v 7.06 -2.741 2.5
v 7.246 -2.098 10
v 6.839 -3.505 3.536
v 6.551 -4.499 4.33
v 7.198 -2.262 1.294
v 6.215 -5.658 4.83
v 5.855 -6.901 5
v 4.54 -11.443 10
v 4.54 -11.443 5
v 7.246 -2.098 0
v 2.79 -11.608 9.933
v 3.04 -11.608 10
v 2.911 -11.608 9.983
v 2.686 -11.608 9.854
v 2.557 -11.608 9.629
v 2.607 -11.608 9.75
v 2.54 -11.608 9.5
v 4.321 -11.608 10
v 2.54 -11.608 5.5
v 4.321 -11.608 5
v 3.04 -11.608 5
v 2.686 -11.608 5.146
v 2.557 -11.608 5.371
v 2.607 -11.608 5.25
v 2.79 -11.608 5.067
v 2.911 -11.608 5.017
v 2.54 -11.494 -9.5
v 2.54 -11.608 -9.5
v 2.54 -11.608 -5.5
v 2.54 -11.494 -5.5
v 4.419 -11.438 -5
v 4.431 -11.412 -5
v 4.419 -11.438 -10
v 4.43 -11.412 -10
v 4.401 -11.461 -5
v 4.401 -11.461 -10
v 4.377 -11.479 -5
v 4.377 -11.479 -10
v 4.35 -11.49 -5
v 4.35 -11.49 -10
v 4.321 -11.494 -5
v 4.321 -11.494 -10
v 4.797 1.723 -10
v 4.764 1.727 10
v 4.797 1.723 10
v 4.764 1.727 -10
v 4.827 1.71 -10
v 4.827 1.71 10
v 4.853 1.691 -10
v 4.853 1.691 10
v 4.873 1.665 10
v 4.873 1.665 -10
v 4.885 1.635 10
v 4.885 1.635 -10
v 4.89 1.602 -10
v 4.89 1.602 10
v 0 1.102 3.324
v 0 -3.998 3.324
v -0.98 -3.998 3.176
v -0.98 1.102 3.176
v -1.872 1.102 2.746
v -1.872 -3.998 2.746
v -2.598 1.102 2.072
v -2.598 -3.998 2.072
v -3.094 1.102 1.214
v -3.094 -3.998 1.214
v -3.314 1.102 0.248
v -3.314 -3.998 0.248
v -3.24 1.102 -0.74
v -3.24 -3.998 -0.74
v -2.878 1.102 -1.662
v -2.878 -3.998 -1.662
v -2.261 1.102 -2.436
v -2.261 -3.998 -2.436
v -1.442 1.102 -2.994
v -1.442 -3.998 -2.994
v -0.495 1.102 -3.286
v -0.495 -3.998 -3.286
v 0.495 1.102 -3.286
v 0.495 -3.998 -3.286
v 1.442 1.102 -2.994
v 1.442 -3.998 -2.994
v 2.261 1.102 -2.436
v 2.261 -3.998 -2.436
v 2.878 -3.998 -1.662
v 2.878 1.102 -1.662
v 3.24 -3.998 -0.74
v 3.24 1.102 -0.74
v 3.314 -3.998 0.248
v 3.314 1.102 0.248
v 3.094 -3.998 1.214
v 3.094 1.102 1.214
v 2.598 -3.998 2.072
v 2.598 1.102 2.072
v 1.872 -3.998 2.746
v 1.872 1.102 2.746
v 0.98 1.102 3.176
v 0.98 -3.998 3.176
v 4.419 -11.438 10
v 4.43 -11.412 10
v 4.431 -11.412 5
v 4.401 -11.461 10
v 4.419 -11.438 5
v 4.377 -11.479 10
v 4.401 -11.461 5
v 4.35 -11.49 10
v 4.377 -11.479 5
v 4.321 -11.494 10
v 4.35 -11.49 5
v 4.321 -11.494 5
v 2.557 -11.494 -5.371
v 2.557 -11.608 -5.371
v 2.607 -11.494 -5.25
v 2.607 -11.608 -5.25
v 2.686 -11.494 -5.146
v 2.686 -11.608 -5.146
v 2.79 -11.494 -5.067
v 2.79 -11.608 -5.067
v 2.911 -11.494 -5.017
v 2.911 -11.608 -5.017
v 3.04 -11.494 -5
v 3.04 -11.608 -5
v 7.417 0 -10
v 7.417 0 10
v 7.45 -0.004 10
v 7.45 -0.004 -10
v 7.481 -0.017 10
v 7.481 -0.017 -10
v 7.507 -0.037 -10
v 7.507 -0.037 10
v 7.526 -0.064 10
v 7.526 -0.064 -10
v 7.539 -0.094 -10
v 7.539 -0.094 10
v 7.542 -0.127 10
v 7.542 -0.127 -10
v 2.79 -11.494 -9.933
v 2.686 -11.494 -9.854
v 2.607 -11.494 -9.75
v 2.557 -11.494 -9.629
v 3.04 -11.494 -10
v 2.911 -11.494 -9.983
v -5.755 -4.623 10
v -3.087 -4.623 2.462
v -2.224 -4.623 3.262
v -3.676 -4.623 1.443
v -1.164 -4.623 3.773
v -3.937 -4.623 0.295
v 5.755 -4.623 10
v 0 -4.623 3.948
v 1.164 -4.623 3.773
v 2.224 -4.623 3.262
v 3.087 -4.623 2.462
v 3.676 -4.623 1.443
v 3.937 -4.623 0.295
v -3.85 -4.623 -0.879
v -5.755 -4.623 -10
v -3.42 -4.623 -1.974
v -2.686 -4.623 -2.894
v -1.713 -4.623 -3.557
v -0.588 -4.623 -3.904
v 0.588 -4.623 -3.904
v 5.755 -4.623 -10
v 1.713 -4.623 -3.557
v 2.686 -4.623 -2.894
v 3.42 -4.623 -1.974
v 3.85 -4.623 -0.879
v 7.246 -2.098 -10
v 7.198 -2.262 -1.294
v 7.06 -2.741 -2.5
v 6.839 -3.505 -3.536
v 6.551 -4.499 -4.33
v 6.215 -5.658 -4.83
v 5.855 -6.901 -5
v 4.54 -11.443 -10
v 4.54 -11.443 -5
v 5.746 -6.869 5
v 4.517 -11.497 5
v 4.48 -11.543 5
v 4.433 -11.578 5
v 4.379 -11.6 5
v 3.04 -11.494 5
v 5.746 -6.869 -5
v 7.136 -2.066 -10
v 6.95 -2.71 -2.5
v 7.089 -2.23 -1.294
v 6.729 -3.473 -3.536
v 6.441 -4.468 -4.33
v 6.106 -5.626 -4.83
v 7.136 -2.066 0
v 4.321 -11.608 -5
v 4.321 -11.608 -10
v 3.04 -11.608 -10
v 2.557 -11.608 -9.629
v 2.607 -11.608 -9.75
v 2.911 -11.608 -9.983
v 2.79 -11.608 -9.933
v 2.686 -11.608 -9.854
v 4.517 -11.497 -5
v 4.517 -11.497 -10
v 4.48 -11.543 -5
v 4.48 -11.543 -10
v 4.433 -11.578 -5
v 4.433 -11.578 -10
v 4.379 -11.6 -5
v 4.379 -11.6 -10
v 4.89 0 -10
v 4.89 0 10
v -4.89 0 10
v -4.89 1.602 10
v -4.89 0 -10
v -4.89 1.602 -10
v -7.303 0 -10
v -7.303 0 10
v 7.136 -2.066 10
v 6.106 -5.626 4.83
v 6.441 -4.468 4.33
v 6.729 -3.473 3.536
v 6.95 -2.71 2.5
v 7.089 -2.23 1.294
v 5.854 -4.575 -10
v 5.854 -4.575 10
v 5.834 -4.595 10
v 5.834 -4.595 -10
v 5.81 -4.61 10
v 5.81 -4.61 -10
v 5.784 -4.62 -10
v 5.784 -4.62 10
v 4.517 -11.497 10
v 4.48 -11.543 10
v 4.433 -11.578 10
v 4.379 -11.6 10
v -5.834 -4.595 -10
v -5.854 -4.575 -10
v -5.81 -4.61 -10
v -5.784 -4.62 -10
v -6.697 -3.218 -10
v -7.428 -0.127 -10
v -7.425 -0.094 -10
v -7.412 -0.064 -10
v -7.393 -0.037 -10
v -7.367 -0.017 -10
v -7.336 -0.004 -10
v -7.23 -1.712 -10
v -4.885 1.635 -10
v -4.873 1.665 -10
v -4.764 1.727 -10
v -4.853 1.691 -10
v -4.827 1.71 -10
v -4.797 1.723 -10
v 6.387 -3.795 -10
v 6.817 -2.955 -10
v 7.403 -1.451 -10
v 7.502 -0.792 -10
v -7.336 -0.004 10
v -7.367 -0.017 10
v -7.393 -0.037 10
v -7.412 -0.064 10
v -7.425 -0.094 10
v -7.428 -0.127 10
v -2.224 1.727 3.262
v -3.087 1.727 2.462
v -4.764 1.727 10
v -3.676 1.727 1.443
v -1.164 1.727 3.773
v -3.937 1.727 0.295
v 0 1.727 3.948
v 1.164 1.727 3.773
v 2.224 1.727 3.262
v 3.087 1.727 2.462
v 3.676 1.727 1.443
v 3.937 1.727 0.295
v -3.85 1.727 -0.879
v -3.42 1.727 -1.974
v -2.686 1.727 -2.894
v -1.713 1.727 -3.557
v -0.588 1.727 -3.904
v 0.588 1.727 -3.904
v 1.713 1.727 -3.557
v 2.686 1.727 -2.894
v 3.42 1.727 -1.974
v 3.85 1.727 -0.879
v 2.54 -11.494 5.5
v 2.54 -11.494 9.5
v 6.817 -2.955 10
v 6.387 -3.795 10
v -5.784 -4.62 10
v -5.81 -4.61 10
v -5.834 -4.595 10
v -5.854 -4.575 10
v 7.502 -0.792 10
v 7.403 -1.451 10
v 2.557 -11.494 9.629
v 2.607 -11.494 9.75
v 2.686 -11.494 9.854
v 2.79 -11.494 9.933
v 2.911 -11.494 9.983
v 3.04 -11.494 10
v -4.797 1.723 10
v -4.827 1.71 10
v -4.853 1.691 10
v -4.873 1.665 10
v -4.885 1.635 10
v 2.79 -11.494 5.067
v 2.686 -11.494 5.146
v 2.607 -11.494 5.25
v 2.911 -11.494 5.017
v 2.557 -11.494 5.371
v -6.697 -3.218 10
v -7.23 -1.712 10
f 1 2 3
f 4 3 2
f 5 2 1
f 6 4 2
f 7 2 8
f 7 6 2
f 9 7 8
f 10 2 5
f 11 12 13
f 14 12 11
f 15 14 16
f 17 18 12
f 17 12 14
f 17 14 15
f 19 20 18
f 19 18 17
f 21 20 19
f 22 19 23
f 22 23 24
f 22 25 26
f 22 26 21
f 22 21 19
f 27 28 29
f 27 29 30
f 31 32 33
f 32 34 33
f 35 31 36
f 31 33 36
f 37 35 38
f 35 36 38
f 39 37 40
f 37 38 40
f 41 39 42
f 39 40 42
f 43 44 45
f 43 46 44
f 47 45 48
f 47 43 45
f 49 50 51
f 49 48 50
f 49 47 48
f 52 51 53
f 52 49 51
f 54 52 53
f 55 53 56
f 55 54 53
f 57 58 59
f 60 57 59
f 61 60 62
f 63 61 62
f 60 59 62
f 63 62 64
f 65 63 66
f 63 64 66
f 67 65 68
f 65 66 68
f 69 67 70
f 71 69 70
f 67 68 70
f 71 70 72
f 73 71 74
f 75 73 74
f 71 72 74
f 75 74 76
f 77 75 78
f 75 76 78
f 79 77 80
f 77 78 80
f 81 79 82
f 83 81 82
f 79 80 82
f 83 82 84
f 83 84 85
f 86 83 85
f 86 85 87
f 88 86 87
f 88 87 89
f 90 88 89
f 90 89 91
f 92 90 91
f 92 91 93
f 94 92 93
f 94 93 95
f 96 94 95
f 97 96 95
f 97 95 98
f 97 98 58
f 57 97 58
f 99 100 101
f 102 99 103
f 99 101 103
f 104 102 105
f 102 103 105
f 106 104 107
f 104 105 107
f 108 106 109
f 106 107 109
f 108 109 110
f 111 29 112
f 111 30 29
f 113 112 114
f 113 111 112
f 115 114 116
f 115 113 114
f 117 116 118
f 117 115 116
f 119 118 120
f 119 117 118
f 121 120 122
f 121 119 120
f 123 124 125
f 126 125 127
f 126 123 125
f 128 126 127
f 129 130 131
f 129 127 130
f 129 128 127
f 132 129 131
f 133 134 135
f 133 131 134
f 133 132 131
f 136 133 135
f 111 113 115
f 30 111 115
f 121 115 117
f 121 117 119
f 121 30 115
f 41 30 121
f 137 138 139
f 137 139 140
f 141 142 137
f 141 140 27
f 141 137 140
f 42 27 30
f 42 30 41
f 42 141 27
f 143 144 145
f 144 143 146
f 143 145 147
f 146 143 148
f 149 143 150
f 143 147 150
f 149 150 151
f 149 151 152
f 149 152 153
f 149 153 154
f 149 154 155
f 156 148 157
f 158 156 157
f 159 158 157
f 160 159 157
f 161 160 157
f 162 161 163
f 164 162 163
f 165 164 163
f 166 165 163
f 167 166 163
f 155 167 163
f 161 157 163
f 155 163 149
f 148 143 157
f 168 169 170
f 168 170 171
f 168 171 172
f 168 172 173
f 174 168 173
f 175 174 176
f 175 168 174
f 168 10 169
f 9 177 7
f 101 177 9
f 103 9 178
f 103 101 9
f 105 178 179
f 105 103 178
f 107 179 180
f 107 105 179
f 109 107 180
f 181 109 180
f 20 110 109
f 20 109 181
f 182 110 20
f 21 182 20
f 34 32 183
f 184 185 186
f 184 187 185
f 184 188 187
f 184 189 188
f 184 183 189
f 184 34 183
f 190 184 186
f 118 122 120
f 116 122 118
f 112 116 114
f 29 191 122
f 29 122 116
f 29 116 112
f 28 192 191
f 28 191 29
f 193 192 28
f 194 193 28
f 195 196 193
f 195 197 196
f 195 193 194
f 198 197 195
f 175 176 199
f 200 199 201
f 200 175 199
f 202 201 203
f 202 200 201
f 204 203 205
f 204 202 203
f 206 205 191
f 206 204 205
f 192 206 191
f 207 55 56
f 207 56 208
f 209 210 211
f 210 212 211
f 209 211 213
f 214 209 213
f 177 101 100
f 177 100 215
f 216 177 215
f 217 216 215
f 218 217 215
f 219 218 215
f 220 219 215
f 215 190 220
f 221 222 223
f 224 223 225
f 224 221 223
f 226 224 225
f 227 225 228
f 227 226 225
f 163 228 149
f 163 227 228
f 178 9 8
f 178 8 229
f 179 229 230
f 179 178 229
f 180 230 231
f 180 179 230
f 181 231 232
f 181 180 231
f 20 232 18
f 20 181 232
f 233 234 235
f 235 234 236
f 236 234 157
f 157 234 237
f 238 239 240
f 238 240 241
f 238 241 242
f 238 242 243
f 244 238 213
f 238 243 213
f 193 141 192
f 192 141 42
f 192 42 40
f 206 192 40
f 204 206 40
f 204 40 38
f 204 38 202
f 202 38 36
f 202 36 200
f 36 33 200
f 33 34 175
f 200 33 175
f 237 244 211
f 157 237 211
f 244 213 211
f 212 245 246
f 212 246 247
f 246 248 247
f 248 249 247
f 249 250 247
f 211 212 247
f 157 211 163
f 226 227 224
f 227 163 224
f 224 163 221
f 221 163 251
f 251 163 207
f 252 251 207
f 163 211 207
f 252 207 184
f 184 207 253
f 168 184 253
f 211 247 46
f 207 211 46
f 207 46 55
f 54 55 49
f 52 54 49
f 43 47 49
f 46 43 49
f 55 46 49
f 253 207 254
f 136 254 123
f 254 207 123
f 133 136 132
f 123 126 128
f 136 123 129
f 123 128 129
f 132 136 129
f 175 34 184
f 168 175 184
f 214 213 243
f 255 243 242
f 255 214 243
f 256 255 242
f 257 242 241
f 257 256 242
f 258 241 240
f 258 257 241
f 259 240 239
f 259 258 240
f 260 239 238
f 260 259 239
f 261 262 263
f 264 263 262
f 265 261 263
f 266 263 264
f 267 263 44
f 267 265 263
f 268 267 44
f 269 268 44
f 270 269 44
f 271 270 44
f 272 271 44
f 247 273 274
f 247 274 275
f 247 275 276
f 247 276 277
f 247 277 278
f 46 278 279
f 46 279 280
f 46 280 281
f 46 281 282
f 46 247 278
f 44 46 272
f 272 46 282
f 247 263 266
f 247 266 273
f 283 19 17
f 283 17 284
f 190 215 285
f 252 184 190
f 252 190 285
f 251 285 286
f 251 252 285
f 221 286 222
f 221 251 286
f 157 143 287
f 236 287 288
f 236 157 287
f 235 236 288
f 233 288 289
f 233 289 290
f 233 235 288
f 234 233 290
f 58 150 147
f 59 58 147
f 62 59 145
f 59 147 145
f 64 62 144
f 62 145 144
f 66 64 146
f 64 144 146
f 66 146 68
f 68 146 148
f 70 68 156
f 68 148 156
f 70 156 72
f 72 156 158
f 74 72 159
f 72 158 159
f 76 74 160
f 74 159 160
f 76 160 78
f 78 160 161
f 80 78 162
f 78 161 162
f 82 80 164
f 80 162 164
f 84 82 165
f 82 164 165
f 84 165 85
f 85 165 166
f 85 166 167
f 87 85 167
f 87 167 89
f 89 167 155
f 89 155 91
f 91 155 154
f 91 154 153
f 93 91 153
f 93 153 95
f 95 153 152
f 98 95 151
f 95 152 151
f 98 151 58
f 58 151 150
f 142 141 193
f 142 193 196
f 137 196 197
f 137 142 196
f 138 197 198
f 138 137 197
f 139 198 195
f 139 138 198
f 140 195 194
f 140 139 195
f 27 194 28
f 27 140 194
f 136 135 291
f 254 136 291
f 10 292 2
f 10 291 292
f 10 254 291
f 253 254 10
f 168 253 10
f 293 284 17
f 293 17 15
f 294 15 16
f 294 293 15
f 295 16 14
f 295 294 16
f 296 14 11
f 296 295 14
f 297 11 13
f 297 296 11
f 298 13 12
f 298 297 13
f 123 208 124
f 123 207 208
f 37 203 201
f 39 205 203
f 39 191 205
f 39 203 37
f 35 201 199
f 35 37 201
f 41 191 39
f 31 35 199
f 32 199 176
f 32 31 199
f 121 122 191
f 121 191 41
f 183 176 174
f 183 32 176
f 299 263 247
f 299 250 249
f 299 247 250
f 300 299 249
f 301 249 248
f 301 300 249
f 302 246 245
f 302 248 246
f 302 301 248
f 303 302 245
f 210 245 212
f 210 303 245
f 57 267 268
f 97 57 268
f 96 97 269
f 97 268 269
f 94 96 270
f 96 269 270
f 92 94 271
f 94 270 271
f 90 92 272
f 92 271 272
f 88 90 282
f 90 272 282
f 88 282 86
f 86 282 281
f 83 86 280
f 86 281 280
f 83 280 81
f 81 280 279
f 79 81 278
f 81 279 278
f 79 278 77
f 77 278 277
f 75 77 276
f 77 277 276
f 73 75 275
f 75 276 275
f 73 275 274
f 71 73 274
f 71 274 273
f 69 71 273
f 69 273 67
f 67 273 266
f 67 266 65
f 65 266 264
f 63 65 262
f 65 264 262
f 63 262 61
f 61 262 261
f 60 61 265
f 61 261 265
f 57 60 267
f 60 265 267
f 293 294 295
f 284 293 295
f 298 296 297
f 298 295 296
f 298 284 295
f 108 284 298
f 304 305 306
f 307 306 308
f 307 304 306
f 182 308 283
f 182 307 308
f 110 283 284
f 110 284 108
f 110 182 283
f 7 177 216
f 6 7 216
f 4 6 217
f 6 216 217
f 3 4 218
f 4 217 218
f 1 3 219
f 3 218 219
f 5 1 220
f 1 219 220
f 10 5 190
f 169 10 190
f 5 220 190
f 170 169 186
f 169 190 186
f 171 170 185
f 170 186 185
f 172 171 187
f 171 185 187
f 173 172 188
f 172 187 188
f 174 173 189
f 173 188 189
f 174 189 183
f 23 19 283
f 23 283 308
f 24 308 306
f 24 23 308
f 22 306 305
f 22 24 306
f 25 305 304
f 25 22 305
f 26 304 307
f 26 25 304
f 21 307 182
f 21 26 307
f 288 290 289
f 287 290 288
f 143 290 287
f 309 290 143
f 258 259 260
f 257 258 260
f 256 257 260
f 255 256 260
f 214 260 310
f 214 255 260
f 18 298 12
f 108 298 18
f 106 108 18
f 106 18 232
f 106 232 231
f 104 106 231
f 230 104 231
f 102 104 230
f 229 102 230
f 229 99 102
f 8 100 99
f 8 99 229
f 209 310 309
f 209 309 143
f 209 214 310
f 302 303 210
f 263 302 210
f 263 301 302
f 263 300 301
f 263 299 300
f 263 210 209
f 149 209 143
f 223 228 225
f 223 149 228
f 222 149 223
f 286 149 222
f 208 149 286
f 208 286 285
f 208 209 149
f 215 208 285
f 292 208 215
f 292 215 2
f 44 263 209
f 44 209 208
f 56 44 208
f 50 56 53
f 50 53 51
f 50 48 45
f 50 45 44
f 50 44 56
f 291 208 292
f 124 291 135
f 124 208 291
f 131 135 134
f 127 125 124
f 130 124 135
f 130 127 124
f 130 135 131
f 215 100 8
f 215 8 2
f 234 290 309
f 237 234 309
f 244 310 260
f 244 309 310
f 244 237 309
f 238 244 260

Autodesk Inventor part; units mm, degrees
ref_plane "YZ Plane" through (0, 0, 0) normal (1, 0, 0) x (0, 1, 0)
ref_plane "XZ Plane" through (0, 0, 0) normal (0, 1, 0) x (-1, 0, 0)
ref_plane "XY Plane" through (0, 0, 0) normal (0, 0, 1) x (1, 0, 0)
sketch "Sketch1" plane through (0, 0, 0) normal (0, 0, 1) x (1, 0, 0)
  line L0 (-4.8895, 1.7272) -> (4.8895, 1.7272)
  line L1 (4.8895, 1.7272) -> (4.8895, 0)
  line L2 (4.8895, 0) -> (7.4295, 0)
  line L3 (-4.8895, 1.7272) -> (-4.8895, 0)
  line L4 (-4.8895, 0) -> (-7.4295, 0)
  line L5 (0, 1.7272) -> (0, -4.6228) construction
  line L6 (-5.8161, -4.6228) -> (5.8161, -4.6228)
  arc A0 (5.8161, -4.6228) -> (7.4295, 0) centre (0, 0) ccw
  arc A1 (-7.4295, 0) -> (-5.8161, -4.6228) centre (0, 0) ccw
  dimension "d0" = 14.859
  dimension "d1" = 9.779
  dimension "d2" = 1.7272
  dimension "d3" = 6.35
extrude "Extrusion1" add sketch "Sketch1" along normal mid plane 20
sketch "Sketch2" plane through (-4.8895, 1.7272, 10) normal (0, 1, 0) x (1, 0, 0)
  point P0 (4.8895, 10)
  point P1 (4.8895, 10)
hole "Hole1" at (0, 1.7272, 0) direction (0, -1, 0) diameter 6.647 end through all thread size "M8x1.25" class "6H" standard "ANSI Metric M Profile"
sketch "Sketch3" plane through (0, 0, 0) normal (0, 0, 1) x (1, 0, 0)
  line L0 (2.54, -11.4938) -> (4.321, -11.4938)
  arc A0 (4.321, -11.4938) -> (4.4305, -11.4115) centre (4.321, -11.3798) ccw
  line L1 (4.4305, -11.4115) -> (7.1364, -2.0663)
  line L2 (7.2459, -2.098) -> (4.54, -11.4432)
  arc A1 (4.321, -11.6078) -> (4.54, -11.4432) centre (4.321, -11.3798) ccw
  line L3 (4.321, -11.6078) -> (2.54, -11.6078)
  line L4 (2.54, -11.6078) -> (2.54, -11.4938)
  arc A2 (7.2459, -2.098) -> (7.5435, 0) centre (0, 0) ccw
  line L5 (7.4295, 0) -> (7.5435, 0)
  arc A3 (7.1364, -2.0663) -> (7.4295, 0) centre (0, 0) ccw
  line L6 (7.4295, 0) -> (4.8895, 0) projected
  line L7 (4.8895, 1.7272) -> (-4.8895, 1.7272) projected
  dimension "d16" = 0.114
  dimension "d17" = 0.114
  dimension "d18" = 2
  dimension "d20" = 13.335
  dimension "d21" = 2.54
extrude "Extrusion2" add sketch "Sketch3" along normal mid plane 20
sketch "Sketch4" plane through (7.1364, -2.0663, -10) normal (-0.9605462, 0.2781205, 0) x (0, 0, 1)
  line L0 (10, 0) -> (10, 0)
  line L1 (15, -5) -> (15, -10.4434)
  line L2 (15, -10.4434) -> (5, -10.4434)
  line L3 (5, -10.4434) -> (5, -5)
  line L4 (20, -10.4434) -> (0, -10.4434) projected
  arc A0 (15, -5) -> (10, 0) centre (10, -5) ccw
  arc A1 (10, 0) -> (5, -5) centre (10, -5) ccw
  line L5 (20, 0) -> (0, 0) projected
  point P0 (10, 0)
  point P1 (10, -10.4434)
  dimension "d24" = 10
  dimension "d25" = 5
extrude "Extrusion3" cut sketch "Sketch4" against normal through all
sketch "Sketch5" plane through (7.2459, -2.098, 10) normal (0.9605462, -0.2781205, 0) x (0, 0, -1)
  line L0 (5, -5) -> (15, -5)
  line L1 (15, -5) -> (15, -10.4434)
  line L2 (15, -10.4434) -> (5, -10.4434)
  line L3 (5, -10.4434) -> (5, -5)
  line L4 (0, -10.4434) -> (20, -10.4434) projected
  line L5 (15, -5) -> (15, -9.7291) projected
extrude "Extrusion4" cut sketch "Sketch5" against normal blind 3
fillet "Fillet1" radius 0.5 4 edges at (2.54, -11.5508, 10) (2.54, -11.5508, 5) (2.54, -11.5508, -5) (2.54, -11.5508, -10)
fillet "Fillet2" radius 0.125 6 edges at (4.8895, 1.7272, 0) (-4.8895, 1.7272, 0) (-7.4295, 0, 0) (5.8161, -4.6228, 0) (-5.8161, -4.6228, 0) (7.5435, 0, 0)
chamfer "Chamfer1" distance 0.625 angle 45 2 edges at (0, 1.7272, -3.3235) (0, -4.6228, -3.3235)
equation "\"d16\" = d17"
properties part number "NUT, SPRING, MK, M8" material "Steel, MS"
